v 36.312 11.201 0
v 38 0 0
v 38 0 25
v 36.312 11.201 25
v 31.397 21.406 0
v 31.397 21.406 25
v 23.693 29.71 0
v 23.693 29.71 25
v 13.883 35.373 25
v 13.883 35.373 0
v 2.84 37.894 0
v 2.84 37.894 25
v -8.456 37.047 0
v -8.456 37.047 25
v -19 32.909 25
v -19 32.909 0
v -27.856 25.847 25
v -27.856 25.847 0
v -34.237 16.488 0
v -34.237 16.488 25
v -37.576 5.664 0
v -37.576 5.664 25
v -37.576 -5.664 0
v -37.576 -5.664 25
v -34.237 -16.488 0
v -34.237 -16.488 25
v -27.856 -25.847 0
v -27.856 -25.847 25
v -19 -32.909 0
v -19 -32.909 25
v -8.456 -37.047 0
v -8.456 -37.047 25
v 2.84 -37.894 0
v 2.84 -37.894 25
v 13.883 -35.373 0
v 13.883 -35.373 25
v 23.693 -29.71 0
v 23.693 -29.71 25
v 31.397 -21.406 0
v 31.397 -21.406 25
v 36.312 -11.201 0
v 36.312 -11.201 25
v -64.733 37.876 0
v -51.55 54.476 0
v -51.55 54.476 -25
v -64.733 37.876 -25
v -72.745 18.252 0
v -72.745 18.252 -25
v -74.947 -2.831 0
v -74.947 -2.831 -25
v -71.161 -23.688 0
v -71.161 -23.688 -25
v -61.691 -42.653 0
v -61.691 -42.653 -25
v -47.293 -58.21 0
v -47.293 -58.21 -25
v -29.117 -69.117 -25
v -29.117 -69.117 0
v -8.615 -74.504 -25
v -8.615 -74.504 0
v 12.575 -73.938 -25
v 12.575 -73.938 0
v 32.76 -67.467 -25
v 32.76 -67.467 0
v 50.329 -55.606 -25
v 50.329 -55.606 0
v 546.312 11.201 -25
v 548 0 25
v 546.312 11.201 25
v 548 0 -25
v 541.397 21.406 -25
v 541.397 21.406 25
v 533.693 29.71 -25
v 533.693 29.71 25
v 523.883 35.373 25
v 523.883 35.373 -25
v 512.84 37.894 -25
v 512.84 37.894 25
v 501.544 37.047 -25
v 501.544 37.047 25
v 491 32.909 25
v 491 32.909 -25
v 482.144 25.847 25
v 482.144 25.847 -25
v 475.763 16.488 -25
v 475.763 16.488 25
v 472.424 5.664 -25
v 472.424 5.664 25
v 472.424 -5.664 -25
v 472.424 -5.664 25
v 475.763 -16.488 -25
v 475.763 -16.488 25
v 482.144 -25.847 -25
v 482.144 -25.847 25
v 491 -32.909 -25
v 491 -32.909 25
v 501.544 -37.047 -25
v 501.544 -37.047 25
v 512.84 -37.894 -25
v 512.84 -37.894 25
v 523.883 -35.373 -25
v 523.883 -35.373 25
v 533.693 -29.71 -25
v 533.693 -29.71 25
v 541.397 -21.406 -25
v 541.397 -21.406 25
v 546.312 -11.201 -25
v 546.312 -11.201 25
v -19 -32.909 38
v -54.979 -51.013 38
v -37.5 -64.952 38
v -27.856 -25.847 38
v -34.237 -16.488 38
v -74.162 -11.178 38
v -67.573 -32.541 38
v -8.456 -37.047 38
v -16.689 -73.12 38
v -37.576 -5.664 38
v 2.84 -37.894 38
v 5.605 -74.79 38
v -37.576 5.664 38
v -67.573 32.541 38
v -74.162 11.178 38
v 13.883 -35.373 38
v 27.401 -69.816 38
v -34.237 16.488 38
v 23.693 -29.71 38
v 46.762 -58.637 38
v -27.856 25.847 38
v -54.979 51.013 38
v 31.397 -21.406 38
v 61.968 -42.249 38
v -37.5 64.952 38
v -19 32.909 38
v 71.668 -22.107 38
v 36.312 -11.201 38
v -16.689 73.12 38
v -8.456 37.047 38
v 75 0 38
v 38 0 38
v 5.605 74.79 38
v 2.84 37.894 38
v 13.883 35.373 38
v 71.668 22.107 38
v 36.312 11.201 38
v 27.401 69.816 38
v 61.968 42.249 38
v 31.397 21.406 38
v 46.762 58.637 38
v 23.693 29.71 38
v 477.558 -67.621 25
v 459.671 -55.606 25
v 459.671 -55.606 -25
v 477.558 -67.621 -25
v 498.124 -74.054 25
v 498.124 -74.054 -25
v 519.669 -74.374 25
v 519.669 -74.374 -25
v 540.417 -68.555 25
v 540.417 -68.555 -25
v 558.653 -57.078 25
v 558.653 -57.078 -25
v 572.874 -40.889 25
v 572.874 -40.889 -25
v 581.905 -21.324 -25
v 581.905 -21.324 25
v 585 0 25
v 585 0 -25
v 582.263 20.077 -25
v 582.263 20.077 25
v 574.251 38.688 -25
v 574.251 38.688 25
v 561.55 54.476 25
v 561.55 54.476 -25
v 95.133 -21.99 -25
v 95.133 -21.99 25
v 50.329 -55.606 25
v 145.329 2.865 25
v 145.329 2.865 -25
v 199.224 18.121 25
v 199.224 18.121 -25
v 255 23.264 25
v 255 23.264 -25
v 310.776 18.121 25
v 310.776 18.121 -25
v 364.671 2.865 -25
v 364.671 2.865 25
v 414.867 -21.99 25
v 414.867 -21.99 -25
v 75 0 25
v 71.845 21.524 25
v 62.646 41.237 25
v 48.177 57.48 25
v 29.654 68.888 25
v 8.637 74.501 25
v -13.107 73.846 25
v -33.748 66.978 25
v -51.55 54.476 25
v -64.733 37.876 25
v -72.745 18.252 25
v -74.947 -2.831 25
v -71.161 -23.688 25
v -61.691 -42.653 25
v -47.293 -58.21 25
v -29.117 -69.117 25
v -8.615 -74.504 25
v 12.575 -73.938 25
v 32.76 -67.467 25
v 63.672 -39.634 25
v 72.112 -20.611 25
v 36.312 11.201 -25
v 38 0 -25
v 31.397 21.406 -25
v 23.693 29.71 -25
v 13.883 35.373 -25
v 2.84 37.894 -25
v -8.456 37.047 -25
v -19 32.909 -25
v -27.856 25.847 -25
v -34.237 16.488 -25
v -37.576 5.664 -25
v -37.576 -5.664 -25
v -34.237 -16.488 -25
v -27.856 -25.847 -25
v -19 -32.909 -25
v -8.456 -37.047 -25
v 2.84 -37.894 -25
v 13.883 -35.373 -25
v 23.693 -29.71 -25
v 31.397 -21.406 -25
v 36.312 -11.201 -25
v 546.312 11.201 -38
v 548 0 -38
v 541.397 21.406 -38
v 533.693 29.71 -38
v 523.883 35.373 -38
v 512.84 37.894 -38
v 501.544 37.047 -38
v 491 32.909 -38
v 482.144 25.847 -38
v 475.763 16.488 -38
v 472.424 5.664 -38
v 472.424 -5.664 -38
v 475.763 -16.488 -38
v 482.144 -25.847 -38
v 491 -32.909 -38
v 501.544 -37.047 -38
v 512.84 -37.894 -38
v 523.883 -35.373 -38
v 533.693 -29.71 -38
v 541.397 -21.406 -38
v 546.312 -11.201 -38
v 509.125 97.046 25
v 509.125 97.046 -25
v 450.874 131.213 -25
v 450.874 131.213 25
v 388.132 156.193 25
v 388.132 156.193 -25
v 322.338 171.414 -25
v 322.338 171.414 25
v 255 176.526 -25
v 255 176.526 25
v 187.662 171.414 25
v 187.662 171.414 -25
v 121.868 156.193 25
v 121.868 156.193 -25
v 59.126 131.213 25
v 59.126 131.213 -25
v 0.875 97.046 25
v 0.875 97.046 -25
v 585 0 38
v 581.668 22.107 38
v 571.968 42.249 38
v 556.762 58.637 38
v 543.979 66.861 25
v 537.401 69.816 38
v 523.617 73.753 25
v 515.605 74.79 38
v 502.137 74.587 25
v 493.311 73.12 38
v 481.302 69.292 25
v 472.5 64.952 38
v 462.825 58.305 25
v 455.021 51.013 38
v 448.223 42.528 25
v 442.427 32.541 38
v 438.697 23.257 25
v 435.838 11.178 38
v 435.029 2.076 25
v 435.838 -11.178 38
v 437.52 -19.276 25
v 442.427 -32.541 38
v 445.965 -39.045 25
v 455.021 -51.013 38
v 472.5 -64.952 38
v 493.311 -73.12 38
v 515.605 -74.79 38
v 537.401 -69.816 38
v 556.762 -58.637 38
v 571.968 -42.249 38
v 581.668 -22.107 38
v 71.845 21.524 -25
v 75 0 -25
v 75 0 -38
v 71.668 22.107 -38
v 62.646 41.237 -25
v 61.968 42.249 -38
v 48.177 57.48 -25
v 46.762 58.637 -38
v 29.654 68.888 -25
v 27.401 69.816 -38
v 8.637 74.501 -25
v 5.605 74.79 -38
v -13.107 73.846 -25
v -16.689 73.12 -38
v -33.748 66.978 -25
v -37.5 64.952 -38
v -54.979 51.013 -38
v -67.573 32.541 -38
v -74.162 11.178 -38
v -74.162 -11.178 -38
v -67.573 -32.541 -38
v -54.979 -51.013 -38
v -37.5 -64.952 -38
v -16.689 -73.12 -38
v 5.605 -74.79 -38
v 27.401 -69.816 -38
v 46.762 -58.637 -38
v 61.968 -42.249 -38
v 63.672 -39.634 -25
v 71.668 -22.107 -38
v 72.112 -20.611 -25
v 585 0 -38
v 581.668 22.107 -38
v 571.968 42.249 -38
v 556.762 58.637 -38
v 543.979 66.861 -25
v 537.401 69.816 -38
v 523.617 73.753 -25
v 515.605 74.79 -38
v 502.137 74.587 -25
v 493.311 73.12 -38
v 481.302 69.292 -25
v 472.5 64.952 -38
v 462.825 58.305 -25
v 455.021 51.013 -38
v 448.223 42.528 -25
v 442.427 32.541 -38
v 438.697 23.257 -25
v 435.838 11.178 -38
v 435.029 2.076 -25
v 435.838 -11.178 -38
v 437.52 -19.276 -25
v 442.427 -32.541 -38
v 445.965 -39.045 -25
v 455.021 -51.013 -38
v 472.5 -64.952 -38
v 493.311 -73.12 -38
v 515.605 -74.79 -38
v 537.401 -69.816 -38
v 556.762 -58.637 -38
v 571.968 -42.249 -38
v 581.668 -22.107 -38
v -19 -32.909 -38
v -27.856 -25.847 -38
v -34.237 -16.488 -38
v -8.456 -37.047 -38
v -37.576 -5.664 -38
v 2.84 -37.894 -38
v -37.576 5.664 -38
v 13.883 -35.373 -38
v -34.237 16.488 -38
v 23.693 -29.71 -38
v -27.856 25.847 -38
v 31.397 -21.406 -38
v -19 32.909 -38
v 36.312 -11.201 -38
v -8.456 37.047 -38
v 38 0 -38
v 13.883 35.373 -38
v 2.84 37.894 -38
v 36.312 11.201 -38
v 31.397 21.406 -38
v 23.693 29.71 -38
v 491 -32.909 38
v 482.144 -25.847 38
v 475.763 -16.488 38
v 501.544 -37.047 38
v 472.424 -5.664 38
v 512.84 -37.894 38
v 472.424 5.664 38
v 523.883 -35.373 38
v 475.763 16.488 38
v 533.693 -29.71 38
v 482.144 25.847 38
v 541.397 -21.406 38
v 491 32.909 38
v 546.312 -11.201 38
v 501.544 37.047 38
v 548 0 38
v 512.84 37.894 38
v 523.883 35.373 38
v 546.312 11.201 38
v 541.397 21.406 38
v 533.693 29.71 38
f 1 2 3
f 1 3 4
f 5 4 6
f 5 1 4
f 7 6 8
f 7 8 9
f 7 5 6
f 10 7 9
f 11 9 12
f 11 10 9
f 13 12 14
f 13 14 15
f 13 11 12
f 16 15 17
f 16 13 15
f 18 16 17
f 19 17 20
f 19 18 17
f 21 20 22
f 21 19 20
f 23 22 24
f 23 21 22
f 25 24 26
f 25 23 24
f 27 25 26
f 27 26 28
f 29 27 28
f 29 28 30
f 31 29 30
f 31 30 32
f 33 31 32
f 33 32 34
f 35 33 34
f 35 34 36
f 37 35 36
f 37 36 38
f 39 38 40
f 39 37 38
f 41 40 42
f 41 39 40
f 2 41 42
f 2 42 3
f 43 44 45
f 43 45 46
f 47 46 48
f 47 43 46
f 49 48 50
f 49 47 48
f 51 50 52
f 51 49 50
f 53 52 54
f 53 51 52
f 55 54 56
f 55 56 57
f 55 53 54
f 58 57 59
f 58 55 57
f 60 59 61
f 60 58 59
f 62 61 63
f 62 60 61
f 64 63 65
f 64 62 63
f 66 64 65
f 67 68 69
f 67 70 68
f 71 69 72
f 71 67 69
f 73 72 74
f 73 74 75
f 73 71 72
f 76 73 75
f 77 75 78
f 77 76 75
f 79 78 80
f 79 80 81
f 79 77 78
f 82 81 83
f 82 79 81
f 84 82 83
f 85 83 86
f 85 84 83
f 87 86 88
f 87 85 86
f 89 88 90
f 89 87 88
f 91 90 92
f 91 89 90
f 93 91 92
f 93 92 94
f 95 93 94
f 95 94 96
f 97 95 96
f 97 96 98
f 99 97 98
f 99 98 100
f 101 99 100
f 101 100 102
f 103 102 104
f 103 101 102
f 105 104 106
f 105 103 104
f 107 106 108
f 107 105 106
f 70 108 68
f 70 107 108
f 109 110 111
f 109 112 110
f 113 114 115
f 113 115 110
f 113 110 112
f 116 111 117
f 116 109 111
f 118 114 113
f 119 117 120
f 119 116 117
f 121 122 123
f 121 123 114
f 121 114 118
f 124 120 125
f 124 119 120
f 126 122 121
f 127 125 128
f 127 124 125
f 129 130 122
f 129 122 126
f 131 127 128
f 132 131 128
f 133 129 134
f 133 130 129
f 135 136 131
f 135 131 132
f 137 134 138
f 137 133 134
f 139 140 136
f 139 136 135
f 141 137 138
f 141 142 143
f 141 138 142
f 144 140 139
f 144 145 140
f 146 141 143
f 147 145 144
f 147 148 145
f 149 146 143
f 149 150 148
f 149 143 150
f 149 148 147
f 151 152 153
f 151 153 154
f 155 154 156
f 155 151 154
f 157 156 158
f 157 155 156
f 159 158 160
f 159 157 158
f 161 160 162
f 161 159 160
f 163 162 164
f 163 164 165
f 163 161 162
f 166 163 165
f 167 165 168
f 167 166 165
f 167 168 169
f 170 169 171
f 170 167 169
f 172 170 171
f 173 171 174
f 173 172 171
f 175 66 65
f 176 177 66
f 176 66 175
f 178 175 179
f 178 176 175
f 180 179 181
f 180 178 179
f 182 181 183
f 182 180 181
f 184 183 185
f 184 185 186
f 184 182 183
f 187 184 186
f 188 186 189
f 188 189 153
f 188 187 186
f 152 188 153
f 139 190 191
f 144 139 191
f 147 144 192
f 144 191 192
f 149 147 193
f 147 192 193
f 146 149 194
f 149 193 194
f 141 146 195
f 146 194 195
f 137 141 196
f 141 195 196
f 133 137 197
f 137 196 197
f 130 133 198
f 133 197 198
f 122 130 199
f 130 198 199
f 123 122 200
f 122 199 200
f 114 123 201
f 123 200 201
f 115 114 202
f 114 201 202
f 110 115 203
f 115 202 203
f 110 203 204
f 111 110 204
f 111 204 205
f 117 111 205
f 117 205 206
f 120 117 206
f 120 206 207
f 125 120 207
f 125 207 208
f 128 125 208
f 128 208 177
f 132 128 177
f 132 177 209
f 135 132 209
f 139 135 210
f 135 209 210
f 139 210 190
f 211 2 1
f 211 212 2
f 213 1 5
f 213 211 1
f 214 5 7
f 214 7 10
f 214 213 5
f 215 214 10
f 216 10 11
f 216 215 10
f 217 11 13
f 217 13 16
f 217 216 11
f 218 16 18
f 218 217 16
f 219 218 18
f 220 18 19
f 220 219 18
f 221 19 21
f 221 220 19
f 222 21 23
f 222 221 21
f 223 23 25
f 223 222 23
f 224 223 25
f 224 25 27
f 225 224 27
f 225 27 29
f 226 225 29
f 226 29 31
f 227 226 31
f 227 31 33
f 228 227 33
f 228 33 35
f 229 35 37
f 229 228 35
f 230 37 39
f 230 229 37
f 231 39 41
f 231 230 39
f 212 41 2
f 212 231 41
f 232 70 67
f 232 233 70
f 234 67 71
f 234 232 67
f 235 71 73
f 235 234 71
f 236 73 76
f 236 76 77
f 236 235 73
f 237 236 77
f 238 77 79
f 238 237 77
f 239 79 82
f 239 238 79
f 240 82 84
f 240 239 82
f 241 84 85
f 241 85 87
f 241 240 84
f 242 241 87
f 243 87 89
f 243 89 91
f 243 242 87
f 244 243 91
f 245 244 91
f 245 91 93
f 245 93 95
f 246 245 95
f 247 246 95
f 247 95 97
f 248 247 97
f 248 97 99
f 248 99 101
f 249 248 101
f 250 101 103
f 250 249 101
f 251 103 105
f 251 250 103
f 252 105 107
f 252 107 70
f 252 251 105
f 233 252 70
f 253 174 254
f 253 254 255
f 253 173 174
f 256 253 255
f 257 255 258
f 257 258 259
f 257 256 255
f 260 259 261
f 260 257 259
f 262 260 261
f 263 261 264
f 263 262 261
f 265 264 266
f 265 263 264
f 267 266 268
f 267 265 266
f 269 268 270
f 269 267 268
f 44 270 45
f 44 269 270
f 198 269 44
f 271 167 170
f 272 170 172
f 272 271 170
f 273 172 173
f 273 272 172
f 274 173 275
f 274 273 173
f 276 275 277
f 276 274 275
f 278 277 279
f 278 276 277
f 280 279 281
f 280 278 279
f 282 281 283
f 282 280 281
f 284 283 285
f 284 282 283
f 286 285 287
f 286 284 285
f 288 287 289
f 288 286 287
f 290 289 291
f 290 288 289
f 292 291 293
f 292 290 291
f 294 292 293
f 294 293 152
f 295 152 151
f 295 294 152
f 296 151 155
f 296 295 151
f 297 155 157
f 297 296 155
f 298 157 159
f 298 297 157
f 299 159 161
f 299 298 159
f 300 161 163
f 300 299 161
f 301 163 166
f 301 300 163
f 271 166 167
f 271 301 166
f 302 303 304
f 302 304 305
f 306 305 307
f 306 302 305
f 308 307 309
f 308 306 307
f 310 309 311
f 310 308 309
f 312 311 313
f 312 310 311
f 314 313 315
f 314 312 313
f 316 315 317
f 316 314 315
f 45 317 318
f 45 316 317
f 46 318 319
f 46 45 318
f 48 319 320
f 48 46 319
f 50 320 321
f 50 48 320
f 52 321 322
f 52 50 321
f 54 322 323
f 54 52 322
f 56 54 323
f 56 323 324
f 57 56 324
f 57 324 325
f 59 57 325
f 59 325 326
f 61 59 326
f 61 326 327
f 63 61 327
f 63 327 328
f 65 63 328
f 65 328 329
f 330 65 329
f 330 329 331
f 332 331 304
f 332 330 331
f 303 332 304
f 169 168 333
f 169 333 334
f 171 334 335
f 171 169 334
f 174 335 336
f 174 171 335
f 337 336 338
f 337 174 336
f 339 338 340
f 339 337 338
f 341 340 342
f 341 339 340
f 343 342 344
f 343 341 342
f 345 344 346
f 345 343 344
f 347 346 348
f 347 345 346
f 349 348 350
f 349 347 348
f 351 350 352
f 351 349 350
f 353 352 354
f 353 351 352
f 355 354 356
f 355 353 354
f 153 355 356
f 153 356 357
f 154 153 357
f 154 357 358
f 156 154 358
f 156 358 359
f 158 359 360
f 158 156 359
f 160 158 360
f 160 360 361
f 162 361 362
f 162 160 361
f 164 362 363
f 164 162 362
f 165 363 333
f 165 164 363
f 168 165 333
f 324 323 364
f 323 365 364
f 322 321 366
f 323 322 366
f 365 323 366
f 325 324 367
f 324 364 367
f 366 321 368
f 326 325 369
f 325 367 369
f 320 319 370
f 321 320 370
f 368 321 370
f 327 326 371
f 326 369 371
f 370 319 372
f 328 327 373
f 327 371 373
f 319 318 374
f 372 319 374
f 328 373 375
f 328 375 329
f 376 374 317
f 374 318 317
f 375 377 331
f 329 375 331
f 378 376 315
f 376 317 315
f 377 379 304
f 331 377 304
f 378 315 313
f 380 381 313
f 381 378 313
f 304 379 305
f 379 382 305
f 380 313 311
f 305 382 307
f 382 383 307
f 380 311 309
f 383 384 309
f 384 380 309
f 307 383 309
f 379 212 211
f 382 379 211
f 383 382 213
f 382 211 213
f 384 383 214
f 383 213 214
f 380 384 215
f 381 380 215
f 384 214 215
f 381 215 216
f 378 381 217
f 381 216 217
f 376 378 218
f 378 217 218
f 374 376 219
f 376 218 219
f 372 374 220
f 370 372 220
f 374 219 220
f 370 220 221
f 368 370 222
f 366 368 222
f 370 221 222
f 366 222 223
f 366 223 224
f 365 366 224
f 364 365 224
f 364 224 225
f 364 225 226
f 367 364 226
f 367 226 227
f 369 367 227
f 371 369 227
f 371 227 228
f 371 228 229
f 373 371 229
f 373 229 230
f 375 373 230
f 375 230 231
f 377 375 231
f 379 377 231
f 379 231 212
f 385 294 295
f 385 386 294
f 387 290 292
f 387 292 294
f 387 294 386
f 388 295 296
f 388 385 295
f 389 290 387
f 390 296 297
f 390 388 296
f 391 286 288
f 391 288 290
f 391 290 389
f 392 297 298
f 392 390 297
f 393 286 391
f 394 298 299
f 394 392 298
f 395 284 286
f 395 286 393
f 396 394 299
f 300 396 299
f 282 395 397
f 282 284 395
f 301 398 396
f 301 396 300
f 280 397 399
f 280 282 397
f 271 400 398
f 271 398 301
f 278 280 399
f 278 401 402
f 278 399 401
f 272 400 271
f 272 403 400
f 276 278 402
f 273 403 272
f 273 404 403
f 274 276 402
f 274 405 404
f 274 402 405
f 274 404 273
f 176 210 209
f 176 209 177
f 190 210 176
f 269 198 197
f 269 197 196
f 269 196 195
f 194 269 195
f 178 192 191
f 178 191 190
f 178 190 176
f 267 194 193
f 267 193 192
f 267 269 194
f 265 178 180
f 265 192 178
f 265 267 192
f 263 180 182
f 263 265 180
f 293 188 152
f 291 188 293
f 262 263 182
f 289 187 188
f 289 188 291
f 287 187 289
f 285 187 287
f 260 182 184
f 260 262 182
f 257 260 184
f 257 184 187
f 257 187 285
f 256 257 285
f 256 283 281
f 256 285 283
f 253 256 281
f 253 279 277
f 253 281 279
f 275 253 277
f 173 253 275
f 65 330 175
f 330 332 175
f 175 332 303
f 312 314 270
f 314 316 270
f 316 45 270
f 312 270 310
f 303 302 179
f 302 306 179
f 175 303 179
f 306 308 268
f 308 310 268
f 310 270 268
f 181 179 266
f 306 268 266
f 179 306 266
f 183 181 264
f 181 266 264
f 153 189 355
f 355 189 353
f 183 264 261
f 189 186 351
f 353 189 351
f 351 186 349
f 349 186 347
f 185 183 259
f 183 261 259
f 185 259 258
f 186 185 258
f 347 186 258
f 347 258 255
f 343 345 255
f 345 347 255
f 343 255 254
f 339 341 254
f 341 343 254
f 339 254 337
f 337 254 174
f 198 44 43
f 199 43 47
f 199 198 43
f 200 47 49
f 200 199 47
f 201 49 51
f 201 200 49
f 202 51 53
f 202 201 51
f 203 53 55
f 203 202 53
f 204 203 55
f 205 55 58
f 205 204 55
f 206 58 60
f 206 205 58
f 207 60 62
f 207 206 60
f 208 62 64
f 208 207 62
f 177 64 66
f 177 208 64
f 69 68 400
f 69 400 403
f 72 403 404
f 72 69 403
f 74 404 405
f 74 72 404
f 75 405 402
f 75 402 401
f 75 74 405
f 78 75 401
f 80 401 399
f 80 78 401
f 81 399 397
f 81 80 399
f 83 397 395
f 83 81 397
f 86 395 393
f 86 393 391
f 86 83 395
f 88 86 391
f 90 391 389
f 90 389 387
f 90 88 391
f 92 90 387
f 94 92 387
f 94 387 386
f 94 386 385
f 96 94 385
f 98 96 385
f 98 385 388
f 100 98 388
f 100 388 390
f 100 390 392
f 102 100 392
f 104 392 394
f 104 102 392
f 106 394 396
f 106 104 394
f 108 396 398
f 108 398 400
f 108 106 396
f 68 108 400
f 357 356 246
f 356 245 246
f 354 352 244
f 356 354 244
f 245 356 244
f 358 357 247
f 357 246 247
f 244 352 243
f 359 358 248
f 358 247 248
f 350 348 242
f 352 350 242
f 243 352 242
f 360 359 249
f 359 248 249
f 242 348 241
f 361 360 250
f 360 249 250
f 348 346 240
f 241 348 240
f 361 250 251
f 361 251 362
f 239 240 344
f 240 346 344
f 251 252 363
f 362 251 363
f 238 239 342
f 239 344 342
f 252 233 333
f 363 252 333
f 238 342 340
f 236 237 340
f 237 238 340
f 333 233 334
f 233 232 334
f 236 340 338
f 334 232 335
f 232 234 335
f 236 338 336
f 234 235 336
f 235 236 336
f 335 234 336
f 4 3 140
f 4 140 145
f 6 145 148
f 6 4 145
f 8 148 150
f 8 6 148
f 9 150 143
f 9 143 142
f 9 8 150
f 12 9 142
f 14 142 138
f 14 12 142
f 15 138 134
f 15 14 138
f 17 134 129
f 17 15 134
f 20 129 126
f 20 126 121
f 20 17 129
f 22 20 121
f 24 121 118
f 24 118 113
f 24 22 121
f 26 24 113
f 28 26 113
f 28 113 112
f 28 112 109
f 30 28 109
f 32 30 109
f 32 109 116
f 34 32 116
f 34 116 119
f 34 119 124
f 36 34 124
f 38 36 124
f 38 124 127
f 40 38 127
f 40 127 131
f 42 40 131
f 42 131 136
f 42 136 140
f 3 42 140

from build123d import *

# Parameters (mm, degrees)
SKETCH1_R           = 38
BOSS_EXTRUDE1_DEPTH = 25
SKETCH2_R           = 75
SKETCH2_R_2         = 38
BOSS_EXTRUDE2_DEPTH = 38


with BuildPart() as part:
    # Sketch1 → Boss-Extrude1 (new, symmetric)
    with BuildSketch(Plane.XY):
        with BuildLine():
            ThreePointArc((-51.549865229, 54.475787235), (-55.04414314, -50.942539257), (50.328947368, -55.605728633))
            ThreePointArc((50.328947368, -55.605728633), (255, 23.26430826), (459.671052632, -55.605728633))
            ThreePointArc((459.671052632, -55.605728633), (565.04414314, -50.942539257), (561.549865229, 54.475787235))
            ThreePointArc((561.549865229, 54.475787235), (255, 176.526439145), (-51.549865229, 54.475787235))
        make_face()
        Circle(SKETCH1_R, mode=Mode.SUBTRACT)
        with Locations((510, 0)):
            Circle(SKETCH1_R, mode=Mode.SUBTRACT)
    extrude(amount=BOSS_EXTRUDE1_DEPTH, both=True)

    # Sketch2 → Boss-Extrude2 (add, symmetric)
    # profile 1 of 2: a face of its own
    with BuildSketch(Plane.XY):
        Circle(SKETCH2_R)
        Circle(SKETCH2_R_2, mode=Mode.SUBTRACT)
    # profile 2 of 2: a face of its own
    with BuildSketch(Plane.XY):
        with Locations((510, 0)):
            Circle(SKETCH2_R)
        with Locations((510, 0)):
            Circle(SKETCH2_R_2, mode=Mode.SUBTRACT)
    extrude(amount=BOSS_EXTRUDE2_DEPTH, both=True)


solid = part.part
